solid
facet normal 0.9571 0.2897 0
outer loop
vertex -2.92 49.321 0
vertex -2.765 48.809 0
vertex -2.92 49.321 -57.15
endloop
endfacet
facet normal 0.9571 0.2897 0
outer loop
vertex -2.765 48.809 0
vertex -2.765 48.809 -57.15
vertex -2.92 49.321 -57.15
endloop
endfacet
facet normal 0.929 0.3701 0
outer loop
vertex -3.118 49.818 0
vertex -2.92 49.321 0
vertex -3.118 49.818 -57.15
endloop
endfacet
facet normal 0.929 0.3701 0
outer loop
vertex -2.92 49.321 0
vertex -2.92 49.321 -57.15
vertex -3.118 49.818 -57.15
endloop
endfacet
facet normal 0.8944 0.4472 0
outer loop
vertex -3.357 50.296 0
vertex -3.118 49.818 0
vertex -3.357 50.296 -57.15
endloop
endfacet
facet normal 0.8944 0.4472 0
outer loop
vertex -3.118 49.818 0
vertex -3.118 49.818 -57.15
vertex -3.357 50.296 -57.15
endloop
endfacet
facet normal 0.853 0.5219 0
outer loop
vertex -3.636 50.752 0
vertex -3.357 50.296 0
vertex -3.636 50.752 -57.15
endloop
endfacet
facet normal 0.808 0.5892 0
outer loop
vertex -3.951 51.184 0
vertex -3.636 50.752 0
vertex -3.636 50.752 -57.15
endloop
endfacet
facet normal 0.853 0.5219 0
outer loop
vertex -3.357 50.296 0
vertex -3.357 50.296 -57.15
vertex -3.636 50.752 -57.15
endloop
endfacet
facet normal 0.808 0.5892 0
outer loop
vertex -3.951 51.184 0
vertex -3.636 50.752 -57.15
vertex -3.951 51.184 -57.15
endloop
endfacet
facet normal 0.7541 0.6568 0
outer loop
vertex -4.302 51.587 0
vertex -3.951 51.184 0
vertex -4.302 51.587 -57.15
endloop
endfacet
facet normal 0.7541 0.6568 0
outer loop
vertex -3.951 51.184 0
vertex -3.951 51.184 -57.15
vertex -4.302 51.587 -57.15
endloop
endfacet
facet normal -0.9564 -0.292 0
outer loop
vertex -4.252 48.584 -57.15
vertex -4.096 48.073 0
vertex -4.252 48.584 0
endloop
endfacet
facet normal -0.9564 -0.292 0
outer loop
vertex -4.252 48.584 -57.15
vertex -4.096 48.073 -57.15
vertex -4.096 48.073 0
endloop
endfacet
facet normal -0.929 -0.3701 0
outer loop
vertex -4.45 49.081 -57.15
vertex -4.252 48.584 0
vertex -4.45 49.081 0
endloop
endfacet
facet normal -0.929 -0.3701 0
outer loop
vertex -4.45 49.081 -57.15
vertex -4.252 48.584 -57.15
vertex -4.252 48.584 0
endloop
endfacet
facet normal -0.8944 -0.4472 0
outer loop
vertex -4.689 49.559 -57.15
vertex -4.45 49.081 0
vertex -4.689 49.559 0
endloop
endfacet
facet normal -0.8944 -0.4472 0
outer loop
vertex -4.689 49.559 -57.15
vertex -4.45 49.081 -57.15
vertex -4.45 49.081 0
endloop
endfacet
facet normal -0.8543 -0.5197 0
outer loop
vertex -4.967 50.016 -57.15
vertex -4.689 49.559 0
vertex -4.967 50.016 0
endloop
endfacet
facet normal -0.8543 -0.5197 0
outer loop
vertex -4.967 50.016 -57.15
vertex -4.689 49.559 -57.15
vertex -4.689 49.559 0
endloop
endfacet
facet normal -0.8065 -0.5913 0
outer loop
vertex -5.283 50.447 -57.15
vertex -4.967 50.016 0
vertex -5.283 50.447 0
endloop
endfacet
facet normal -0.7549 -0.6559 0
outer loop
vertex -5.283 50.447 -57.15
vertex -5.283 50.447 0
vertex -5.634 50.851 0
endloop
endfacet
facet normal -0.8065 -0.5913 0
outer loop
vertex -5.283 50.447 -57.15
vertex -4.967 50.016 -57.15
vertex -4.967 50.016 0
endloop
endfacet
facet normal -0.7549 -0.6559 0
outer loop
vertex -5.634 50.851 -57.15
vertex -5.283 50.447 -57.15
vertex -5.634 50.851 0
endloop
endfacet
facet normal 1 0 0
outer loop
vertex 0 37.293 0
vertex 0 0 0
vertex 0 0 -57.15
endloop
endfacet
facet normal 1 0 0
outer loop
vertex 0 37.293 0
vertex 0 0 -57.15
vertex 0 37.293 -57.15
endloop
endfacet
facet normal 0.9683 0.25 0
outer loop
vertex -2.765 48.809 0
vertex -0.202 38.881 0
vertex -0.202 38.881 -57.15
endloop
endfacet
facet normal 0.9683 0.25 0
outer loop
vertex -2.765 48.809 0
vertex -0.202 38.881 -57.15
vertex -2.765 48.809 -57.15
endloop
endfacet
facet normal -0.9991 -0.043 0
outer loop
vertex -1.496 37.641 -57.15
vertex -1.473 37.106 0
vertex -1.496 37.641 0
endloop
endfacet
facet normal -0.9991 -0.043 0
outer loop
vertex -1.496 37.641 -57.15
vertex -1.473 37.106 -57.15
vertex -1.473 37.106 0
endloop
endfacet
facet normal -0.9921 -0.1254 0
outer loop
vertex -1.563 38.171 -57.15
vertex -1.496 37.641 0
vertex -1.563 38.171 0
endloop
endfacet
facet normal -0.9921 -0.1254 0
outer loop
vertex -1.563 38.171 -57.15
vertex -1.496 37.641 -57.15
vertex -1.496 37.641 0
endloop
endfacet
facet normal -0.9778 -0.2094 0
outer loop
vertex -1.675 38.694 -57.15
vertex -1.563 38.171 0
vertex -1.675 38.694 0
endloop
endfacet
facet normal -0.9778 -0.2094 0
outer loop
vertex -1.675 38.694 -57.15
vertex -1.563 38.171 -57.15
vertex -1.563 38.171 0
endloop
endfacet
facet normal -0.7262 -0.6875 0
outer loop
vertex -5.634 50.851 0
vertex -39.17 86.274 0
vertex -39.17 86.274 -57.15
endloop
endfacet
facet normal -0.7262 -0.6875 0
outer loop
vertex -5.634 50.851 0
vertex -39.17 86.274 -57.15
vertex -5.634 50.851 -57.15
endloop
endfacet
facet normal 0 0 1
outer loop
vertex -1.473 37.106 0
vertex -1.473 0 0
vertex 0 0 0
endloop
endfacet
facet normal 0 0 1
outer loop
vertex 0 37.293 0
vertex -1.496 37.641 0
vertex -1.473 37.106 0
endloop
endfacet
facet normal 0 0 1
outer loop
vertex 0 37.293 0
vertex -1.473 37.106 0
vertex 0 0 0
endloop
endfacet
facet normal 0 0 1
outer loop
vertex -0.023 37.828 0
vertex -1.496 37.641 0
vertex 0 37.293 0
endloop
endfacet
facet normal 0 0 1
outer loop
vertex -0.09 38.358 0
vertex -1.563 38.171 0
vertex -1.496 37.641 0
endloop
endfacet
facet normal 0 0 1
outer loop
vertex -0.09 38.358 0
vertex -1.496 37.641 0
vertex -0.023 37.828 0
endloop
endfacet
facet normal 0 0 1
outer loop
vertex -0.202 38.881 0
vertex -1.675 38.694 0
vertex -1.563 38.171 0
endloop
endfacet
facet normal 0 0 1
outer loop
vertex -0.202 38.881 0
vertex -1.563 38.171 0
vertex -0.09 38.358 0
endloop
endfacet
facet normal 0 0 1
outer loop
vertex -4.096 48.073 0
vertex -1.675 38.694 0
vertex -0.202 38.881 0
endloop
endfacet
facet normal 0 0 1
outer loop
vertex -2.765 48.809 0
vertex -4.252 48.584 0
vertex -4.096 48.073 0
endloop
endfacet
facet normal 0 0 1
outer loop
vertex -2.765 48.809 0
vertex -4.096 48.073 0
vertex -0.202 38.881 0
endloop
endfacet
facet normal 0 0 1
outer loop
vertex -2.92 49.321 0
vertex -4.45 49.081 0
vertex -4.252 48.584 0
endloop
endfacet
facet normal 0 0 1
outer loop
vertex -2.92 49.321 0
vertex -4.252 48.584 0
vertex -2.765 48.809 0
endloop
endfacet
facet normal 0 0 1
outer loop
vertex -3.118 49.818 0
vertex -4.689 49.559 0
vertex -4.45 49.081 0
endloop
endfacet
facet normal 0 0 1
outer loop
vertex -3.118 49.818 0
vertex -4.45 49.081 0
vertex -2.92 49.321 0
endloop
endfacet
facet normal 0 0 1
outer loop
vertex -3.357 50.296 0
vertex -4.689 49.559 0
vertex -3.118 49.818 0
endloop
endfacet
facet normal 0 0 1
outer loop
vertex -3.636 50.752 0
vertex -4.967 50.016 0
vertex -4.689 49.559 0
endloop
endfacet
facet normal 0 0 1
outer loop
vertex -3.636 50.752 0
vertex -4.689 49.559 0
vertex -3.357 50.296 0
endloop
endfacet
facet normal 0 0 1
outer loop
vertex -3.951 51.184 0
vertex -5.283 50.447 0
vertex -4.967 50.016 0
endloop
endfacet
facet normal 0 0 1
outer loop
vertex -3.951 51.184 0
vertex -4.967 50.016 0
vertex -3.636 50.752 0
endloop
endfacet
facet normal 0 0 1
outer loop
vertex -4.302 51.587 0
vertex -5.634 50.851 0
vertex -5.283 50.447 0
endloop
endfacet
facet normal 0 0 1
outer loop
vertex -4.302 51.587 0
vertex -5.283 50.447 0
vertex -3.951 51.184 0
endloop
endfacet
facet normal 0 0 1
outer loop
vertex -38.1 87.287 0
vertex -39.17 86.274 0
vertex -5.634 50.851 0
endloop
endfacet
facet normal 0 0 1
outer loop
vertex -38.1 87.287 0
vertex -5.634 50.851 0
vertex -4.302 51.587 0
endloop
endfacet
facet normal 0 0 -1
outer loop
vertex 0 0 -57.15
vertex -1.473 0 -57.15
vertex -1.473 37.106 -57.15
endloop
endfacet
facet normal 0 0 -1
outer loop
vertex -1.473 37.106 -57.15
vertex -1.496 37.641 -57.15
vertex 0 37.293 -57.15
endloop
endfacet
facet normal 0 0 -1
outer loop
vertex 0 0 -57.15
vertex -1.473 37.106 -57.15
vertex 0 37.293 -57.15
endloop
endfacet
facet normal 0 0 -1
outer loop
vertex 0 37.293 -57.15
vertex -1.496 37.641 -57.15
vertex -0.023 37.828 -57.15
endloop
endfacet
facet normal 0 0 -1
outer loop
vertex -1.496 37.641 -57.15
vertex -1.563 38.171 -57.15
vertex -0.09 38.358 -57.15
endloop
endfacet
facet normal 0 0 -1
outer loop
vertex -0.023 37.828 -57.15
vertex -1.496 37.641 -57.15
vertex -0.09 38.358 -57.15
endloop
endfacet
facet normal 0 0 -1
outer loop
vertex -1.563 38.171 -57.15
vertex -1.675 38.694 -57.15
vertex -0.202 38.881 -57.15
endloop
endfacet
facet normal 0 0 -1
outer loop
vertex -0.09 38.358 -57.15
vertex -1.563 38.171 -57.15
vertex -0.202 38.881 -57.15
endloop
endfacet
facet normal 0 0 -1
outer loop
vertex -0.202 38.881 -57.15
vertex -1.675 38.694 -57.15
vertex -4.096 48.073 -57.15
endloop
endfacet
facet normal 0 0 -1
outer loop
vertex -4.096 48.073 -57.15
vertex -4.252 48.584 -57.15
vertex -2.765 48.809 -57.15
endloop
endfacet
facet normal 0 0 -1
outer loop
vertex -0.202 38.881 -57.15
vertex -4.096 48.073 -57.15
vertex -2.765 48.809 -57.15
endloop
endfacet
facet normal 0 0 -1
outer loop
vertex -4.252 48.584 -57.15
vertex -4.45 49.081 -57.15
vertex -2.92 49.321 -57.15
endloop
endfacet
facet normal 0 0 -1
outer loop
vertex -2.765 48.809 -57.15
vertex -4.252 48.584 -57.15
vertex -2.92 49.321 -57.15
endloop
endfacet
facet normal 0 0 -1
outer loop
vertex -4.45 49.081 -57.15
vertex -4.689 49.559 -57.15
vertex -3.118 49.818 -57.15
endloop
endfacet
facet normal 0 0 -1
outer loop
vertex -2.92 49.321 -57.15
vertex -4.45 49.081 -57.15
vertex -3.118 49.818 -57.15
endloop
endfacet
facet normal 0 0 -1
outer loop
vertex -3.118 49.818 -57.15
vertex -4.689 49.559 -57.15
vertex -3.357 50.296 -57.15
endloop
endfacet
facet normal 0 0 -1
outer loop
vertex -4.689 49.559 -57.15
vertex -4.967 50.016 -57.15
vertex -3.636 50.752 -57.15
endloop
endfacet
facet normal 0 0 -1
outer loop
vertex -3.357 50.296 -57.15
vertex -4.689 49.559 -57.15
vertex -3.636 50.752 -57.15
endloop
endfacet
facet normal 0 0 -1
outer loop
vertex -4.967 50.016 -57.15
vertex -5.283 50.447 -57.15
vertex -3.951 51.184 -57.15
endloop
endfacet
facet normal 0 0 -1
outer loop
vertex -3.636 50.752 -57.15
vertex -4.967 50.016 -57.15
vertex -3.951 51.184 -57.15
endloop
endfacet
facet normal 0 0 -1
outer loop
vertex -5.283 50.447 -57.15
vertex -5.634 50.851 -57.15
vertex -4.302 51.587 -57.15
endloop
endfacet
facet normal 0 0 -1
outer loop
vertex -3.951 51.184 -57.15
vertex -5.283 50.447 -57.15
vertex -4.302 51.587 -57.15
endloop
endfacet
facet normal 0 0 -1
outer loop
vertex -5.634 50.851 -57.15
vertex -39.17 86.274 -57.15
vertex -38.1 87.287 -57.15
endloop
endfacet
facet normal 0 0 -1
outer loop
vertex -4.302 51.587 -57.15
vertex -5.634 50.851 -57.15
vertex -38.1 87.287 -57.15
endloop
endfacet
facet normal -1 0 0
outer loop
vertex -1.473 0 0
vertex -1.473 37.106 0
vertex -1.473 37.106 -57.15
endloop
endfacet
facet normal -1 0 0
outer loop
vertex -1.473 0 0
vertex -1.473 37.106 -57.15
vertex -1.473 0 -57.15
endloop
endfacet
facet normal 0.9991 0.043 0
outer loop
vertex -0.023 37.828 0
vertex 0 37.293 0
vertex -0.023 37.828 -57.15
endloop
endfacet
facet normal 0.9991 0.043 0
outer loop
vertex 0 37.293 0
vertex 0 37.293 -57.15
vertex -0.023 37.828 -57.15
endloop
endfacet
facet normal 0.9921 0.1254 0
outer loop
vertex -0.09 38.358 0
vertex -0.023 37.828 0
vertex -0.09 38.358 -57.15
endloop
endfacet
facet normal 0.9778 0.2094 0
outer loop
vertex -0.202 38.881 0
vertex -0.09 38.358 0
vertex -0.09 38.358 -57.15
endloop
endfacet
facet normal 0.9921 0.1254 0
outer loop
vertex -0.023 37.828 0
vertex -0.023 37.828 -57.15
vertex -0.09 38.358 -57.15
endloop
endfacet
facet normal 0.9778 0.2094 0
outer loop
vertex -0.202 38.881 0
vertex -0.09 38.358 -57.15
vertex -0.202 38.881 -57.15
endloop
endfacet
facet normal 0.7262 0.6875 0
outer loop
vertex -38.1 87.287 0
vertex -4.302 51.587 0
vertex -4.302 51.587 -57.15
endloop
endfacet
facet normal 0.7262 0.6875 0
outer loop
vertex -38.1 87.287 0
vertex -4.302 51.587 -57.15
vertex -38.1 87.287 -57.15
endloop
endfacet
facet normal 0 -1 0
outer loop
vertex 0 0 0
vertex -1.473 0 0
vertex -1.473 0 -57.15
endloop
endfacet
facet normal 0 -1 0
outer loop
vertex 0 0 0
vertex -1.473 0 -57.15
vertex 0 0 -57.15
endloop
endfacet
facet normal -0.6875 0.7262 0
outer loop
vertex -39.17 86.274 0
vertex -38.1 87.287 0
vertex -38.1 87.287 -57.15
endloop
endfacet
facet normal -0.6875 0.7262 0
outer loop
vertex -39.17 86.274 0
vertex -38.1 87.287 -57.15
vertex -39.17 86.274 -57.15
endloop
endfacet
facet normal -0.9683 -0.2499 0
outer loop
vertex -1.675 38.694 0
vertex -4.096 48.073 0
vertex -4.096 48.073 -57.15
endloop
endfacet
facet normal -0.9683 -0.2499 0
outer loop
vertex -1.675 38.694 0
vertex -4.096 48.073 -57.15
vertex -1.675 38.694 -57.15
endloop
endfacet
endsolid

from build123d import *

# Parameters (mm, degrees)
BOSS_EXTRUDE1_DEPTH = 57.15
FILLET1_R           = 6.35
FILLET2_R           = 6.35


with BuildPart() as part:
    # Sketch2 → Boss-Extrude1 (new body)
    with BuildSketch(Plane.XY):
        Polygon((0, 0), (0, 38.1), (-3.175, 50.396722124), (-38.1, 87.286888497), (-39.169814825, 86.274063497), (-4.506325115, 49.660122124), (-1.4732, 37.912879066), (-1.4732, 0), align=None)
    extrude(amount=-BOSS_EXTRUDE1_DEPTH)

    # Fillet1
    fillet1_edges = [part.edges().sort_by_distance(p)[0] for p in [
        (-3.175, 50.396722124, -28.575),
        (0, 38.1, -28.575),
    ]]
    fillet(fillet1_edges, radius=FILLET1_R)

    # Fillet2
    fillet2_edges = [part.edges().sort_by_distance(p)[0] for p in [
        (-1.4732, 37.912879066, -28.575),
        (-4.506325115, 49.660122124, -28.575),
    ]]
    fillet(fillet2_edges, radius=FILLET2_R)


solid = part.part
